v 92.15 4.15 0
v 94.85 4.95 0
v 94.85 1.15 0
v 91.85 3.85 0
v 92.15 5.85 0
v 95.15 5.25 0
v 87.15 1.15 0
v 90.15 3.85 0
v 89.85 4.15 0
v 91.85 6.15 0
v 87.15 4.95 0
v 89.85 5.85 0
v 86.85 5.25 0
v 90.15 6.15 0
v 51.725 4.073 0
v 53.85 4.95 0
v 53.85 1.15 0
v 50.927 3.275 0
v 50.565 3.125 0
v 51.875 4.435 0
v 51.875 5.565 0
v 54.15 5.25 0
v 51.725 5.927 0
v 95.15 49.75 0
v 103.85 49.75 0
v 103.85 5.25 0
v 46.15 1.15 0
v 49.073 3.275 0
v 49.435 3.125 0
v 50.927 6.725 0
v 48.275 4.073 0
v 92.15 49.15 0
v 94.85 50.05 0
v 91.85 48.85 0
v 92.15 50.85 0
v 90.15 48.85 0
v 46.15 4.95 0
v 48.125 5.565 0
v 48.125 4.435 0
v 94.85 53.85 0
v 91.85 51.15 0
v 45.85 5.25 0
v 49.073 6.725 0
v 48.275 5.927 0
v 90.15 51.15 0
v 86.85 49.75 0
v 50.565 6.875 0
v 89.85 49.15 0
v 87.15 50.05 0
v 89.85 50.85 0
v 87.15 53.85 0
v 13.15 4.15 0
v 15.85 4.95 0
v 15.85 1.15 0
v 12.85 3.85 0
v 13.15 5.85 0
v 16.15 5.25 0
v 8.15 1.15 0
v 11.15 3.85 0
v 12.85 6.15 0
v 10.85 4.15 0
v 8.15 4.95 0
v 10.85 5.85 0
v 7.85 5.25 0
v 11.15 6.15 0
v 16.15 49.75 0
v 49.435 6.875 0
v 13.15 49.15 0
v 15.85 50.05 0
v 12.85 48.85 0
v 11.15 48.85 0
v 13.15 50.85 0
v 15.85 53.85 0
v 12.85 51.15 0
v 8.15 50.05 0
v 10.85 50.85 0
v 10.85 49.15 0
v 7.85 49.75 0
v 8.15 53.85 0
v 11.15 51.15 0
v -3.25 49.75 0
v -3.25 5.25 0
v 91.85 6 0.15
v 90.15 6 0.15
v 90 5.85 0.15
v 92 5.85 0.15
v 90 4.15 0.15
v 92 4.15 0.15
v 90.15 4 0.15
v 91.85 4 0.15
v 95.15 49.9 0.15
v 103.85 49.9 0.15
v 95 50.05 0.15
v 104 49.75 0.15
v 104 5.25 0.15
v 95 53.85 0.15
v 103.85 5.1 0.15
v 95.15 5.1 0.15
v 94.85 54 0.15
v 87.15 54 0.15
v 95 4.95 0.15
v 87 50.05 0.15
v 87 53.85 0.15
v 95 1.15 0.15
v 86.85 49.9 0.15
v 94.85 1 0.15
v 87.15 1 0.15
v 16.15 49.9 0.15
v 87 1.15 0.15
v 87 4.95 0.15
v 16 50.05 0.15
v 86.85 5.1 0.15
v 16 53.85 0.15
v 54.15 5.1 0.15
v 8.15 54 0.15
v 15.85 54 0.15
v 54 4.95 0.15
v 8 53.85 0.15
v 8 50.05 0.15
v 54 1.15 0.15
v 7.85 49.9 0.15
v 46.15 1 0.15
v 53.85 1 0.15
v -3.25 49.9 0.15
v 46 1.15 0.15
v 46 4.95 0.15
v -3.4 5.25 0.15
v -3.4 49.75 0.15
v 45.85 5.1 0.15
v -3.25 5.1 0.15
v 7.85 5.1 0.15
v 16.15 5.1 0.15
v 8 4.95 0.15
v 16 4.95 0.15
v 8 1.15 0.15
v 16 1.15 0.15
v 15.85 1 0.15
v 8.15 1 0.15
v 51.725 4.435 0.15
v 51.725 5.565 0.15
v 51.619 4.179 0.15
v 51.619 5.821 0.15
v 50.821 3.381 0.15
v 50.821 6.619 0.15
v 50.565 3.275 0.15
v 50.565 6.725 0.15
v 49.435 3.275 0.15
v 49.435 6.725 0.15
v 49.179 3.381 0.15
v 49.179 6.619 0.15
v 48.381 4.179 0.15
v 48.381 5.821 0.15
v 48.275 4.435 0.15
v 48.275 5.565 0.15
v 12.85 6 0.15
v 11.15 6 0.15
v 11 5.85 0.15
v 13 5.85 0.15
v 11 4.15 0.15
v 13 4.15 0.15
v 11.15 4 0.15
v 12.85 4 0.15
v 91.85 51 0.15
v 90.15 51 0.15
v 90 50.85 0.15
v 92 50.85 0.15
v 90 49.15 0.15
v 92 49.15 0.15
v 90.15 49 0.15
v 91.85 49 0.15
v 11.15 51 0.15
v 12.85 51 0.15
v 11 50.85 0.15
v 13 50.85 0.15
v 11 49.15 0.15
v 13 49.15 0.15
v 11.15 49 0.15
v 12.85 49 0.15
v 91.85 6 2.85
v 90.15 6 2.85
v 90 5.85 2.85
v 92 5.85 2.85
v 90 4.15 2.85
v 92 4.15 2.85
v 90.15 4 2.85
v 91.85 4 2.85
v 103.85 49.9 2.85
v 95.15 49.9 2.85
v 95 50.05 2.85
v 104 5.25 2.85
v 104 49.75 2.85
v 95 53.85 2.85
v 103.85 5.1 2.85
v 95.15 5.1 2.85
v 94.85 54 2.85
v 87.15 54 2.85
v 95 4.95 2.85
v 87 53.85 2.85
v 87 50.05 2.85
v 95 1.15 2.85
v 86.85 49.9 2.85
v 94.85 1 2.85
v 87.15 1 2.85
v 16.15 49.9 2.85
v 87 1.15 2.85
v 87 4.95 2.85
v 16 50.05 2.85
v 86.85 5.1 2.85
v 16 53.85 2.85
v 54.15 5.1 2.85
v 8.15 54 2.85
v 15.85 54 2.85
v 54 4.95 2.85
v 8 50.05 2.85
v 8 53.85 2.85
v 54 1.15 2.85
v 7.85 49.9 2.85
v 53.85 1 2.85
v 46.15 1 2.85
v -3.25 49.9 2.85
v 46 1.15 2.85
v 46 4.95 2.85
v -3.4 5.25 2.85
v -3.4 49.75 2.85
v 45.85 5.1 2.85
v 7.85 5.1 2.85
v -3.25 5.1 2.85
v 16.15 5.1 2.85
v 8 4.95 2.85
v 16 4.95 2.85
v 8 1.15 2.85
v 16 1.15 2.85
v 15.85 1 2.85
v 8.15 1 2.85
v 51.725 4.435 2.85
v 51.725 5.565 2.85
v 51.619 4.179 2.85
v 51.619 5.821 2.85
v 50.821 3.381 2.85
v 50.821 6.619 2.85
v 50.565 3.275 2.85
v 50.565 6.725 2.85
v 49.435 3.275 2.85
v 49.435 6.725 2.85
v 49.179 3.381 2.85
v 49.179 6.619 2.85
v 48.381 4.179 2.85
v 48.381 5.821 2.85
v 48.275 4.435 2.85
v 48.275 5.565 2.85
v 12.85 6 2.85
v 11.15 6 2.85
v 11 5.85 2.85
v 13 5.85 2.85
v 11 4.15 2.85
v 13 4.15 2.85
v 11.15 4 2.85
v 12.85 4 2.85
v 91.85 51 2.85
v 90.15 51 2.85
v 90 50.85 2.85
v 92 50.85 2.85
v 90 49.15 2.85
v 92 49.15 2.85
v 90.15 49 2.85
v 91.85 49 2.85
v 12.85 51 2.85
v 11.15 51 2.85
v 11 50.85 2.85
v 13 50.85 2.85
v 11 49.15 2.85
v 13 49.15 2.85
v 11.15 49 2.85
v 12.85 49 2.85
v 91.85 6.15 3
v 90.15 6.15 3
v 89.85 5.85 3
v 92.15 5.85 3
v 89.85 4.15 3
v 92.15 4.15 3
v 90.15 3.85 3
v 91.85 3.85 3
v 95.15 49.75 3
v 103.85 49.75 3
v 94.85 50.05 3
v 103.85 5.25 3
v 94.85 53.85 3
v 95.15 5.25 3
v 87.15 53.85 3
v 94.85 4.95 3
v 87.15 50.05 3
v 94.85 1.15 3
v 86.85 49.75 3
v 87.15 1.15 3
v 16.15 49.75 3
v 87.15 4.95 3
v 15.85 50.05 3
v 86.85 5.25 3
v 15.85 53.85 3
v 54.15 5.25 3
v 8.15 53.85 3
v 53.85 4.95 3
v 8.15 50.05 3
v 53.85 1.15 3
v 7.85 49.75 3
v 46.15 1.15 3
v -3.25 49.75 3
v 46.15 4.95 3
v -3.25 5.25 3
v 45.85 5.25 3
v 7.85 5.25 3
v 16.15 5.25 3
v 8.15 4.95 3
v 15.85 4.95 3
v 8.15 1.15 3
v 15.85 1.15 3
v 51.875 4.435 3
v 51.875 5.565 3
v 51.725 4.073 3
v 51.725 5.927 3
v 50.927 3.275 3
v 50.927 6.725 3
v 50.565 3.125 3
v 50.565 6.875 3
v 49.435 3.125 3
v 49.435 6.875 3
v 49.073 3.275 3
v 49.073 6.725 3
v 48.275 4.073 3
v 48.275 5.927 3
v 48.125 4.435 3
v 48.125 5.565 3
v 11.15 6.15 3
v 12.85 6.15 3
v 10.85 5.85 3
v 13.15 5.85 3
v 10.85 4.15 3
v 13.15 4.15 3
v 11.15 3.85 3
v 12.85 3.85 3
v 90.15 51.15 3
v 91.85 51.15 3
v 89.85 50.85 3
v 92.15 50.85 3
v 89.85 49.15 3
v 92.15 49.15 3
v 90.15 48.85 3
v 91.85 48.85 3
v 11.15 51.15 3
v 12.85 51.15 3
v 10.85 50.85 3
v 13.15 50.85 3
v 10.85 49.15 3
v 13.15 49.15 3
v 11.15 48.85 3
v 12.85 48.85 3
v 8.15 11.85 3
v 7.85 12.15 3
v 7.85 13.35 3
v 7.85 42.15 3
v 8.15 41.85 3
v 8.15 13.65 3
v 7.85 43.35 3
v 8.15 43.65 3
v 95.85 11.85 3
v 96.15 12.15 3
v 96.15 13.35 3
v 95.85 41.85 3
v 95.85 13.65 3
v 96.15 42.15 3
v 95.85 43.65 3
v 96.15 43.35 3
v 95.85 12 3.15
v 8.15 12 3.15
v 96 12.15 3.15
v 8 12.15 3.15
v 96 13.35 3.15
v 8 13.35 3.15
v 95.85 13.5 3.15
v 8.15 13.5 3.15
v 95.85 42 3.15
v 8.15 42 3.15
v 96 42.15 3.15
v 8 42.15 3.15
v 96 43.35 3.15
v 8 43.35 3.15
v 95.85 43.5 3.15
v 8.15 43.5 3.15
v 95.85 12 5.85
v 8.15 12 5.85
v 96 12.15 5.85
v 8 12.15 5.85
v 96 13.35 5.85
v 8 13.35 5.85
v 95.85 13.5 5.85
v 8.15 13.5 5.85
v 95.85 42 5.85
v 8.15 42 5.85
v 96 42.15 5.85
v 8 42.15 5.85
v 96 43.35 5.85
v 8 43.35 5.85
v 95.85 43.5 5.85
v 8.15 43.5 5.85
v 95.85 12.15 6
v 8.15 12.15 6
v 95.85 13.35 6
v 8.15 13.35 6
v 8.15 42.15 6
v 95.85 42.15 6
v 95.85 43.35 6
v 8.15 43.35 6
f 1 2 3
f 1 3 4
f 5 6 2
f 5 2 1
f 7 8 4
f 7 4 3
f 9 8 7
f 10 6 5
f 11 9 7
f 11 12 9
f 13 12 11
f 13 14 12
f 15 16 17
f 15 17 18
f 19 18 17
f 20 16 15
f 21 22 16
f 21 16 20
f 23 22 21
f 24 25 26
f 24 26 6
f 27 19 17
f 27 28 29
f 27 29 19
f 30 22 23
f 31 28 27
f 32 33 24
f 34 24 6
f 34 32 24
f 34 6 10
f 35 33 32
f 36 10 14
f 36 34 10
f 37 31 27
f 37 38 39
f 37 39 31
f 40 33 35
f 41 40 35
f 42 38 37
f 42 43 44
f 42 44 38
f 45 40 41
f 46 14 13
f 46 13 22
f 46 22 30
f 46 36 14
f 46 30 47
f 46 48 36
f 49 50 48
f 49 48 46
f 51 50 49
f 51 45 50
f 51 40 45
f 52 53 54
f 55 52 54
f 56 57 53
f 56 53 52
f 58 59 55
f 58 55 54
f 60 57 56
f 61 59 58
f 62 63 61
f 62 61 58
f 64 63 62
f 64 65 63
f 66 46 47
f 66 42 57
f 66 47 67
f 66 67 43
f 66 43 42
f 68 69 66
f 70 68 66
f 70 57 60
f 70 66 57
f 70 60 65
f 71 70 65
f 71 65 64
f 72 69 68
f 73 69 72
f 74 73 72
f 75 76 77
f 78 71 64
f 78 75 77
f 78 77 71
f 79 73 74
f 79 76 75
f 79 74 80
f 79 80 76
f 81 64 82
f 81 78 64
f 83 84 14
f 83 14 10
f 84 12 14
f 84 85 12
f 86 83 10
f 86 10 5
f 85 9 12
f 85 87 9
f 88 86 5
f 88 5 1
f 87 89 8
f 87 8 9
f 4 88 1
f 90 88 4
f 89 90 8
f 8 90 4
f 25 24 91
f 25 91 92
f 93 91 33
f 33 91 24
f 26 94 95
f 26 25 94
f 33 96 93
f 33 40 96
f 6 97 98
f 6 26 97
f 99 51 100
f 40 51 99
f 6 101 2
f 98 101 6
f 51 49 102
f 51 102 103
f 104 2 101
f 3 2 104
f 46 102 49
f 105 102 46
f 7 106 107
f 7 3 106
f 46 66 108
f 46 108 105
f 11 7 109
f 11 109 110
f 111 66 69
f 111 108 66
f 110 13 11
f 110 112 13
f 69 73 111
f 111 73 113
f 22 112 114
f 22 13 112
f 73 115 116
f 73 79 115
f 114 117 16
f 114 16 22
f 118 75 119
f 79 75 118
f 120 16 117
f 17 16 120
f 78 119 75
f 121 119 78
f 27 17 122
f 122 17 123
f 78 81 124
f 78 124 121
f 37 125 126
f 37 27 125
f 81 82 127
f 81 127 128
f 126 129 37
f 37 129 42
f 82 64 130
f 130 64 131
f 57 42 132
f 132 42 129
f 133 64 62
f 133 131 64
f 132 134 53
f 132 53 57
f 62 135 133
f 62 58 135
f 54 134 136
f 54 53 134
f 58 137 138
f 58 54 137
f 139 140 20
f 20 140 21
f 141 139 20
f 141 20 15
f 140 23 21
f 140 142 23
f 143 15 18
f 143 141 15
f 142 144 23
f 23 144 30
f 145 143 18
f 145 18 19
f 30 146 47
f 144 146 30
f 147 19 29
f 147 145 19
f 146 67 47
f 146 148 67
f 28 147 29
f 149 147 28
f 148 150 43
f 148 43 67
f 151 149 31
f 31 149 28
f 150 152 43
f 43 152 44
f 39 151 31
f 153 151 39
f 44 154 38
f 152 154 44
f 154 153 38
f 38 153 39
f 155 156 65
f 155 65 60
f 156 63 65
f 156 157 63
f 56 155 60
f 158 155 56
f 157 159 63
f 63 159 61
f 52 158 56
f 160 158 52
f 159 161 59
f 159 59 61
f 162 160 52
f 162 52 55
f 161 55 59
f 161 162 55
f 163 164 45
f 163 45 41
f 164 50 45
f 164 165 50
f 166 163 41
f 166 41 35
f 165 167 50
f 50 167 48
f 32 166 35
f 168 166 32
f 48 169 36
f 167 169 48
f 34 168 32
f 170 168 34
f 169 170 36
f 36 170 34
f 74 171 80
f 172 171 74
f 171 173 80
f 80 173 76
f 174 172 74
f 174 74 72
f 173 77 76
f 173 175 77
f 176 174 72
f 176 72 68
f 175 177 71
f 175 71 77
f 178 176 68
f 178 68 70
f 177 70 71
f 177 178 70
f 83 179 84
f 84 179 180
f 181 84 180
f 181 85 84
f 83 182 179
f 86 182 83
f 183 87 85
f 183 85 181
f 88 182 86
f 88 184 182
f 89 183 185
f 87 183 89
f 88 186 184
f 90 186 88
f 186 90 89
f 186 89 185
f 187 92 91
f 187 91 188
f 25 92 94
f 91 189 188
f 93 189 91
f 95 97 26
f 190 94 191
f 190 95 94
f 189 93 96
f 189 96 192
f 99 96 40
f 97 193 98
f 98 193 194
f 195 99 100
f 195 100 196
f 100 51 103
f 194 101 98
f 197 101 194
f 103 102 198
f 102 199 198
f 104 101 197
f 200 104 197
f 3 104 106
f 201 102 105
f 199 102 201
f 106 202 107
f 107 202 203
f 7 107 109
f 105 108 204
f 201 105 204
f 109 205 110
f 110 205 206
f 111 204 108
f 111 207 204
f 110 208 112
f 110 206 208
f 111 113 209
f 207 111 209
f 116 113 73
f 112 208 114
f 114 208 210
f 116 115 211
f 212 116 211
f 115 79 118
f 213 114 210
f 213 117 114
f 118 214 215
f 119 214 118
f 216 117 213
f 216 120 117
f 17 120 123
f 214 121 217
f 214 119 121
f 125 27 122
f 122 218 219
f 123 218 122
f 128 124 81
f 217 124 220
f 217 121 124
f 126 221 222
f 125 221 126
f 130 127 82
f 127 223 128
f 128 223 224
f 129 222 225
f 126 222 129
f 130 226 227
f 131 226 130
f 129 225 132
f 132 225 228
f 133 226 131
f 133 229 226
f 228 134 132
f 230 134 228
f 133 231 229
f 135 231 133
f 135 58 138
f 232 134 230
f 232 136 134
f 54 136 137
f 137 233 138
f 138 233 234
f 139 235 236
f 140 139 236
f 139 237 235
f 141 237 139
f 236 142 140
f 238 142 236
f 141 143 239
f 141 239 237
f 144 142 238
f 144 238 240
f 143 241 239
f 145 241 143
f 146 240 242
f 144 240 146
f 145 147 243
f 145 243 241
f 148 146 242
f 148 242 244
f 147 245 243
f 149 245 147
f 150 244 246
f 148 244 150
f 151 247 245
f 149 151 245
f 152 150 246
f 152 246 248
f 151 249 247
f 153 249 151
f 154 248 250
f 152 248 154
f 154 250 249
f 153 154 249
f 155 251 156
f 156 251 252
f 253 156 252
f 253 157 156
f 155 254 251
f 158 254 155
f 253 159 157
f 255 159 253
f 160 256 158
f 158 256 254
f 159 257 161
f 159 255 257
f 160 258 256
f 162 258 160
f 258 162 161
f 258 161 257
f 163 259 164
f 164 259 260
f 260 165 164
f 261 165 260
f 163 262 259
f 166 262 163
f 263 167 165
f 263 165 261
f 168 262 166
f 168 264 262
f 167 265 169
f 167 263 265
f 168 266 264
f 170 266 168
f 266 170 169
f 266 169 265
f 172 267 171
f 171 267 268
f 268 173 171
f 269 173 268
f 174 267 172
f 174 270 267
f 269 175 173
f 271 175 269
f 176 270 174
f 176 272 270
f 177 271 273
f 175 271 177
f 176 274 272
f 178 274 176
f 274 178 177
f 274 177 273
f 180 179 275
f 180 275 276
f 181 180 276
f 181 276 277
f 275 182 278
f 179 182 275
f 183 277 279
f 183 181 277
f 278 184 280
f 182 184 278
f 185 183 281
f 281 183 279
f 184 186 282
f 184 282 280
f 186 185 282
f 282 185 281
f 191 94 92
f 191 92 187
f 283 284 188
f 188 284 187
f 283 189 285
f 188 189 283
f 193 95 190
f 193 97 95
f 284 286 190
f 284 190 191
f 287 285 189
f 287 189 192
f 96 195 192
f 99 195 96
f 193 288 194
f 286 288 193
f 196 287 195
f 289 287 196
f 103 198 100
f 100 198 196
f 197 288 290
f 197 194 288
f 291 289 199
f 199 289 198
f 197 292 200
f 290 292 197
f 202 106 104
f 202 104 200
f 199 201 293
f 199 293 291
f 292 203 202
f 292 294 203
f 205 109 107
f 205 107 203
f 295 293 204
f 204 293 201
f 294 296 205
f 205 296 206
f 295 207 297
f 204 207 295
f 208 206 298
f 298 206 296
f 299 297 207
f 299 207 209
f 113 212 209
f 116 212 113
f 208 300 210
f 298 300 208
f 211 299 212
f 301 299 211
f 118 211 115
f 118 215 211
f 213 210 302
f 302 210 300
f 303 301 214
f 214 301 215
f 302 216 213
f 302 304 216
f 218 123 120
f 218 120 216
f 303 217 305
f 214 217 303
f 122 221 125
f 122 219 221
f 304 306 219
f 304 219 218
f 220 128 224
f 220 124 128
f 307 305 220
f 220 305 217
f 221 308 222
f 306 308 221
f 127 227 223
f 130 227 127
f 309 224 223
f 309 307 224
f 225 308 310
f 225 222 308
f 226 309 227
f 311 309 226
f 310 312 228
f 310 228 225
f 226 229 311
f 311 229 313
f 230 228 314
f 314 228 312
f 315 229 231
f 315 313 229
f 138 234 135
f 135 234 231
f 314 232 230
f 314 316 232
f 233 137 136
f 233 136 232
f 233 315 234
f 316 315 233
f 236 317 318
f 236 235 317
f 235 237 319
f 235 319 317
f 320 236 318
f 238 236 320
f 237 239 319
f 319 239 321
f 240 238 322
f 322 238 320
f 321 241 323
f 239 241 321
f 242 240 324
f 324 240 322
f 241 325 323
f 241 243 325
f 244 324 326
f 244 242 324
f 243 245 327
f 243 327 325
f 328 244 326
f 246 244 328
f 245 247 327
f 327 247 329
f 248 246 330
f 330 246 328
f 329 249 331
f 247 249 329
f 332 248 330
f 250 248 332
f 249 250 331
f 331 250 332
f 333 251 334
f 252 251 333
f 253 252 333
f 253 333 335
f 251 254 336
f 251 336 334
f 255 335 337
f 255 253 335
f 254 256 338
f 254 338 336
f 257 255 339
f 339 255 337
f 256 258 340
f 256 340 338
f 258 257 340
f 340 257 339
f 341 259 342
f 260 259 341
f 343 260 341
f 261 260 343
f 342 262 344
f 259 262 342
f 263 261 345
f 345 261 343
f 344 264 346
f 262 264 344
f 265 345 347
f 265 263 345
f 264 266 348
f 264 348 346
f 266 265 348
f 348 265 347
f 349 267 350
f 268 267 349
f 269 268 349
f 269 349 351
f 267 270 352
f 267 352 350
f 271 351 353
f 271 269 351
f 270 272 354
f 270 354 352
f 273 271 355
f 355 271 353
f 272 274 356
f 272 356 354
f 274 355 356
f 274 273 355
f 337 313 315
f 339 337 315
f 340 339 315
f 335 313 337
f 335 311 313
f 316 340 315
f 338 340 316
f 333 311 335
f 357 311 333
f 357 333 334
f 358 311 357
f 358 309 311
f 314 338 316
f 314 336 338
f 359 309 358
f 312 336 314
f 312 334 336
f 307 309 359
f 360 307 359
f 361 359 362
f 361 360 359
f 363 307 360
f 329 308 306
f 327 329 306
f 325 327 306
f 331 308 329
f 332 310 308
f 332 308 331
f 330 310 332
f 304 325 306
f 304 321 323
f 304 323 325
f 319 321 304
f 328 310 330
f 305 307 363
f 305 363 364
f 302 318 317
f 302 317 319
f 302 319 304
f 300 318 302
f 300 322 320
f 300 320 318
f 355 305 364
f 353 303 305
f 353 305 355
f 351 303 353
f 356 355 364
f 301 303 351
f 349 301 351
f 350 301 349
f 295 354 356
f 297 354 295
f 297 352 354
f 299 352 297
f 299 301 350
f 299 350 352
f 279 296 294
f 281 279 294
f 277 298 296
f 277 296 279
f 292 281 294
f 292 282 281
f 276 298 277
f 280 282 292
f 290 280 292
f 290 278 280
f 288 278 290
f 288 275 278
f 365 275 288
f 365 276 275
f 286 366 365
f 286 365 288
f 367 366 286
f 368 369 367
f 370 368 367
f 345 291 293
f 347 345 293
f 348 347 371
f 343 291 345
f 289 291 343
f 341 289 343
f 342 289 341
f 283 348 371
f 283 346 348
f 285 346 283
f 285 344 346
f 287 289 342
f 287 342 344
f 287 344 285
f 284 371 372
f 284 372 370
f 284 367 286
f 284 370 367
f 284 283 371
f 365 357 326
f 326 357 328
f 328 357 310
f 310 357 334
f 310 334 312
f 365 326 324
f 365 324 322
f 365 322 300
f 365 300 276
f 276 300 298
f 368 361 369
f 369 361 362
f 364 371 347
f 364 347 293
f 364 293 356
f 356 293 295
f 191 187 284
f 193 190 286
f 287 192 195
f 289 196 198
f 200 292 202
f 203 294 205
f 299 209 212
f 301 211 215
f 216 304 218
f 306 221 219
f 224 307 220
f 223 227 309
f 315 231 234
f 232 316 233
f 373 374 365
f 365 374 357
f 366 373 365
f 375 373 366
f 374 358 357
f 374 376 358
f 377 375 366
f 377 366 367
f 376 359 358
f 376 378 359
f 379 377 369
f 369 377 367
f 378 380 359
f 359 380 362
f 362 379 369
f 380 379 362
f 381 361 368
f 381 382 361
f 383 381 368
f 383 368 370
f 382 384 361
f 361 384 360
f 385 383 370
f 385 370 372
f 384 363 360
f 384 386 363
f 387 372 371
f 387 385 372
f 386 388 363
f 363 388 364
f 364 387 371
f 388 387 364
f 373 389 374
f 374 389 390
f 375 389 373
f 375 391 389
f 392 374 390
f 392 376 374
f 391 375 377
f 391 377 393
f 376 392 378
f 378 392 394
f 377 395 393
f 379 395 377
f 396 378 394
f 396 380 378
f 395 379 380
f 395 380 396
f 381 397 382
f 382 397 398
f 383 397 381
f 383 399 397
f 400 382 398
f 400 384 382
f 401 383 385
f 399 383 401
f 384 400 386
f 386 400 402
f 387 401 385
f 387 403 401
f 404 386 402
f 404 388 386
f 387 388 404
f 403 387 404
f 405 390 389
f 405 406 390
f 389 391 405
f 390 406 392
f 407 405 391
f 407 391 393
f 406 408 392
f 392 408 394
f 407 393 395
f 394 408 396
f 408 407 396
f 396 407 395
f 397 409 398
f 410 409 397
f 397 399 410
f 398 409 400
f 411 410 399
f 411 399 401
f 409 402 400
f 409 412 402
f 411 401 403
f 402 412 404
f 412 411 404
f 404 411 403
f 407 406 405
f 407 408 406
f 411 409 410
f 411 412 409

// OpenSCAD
// Generated from canonical Python sources by spec/revise_parent_battery_top_lid.py.
polyhedron(points=[[92.1500015258789, 4.150000095367432, 0.0], [94.8499984741211, 4.949999809265137, 0.0], [94.8499984741211, 1.149999976158142, 5.9999998100067255e-15], [91.8499984741211, 3.8499999046325684, 0.0], [92.1500015258789, 5.849999904632568, 0.0], [95.1500015258789, 5.25, 0.0], [87.1500015258789, 1.149999976158142, -1.0000000036274937e-15], [90.1500015258789, 3.8499999046325684, 0.0], [89.8499984741211, 4.150000095367432, 0.0], [91.8499984741211, 6.150000095367432, 0.0], [87.1500015258789, 4.949999809265137, 0.0], [89.8499984741211, 5.849999904632568, 0.0], [86.8499984741211, 5.25, 0.0], [90.1500015258789, 6.150000095367432, 0.0], [51.724998474121094, 4.073349475860596, 0.0], [53.849998474121094, 4.949999809265137, 0.0], [53.849998474121094, 1.149999976158142, 2.9999999050033628e-15], [50.92665100097656, 3.2750000953674316, 0.0], [50.564517974853516, 3.125, 0.0], [51.875, 4.435481548309326, 0.0], [51.875, 5.564518451690674, 0.0], [54.150001525878906, 5.25, 0.0], [51.724998474121094, 5.926650524139404, 0.0], [95.1500015258789, 49.75, 0.0], [103.8499984741211, 49.75, 2.0000000072549875e-15], [103.8499984741211, 5.25, 1.0000000036274937e-15], [46.150001525878906, 1.149999976158142, 1.0000000036274937e-15], [49.07334899902344, 3.2750000953674316, 0.0], [49.435482025146484, 3.125, 0.0], [50.92665100097656, 6.724999904632568, 0.0], [48.275001525878906, 4.073349475860596, 0.0], [92.1500015258789, 49.150001525878906, 0.0], [94.8499984741211, 50.04999923706055, 0.0], [91.8499984741211, 48.849998474121094, 0.0], [92.1500015258789, 50.849998474121094, 0.0], [90.1500015258789, 48.849998474121094, 0.0], [46.150001525878906, 4.949999809265137, 0.0], [48.125, 5.564518451690674, 0.0], [48.125, 4.435481548309326, 0.0], [94.8499984741211, 53.849998474121094, 9.000000350284799e-15], [91.8499984741211, 51.150001525878906, 0.0], [45.849998474121094, 5.25, 0.0], [49.07334899902344, 6.724999904632568, 0.0], [48.275001525878906, 5.926650524139404, 0.0], [90.1500015258789, 51.150001525878906, 0.0], [86.8499984741211, 49.75, 0.0], [50.564517974853516, 6.875, 0.0], [89.8499984741211, 49.150001525878906, 0.0], [87.1500015258789, 50.04999923706055, 0.0], [89.8499984741211, 50.849998474121094, 0.0], [87.1500015258789, 53.849998474121094, 2.0000000072549875e-15], [13.149999618530273, 4.150000095367432, 0.0], [15.850000381469727, 4.949999809265137, 0.0], [15.850000381469727, 1.149999976158142, 0.0], [12.850000381469727, 3.8499999046325684, 0.0], [13.149999618530273, 5.849999904632568, 0.0], [16.149999618530273, 5.25, 0.0], [8.149999618530273, 1.149999976158142, 0.0], [11.149999618530273, 3.8499999046325684, 0.0], [12.850000381469727, 6.150000095367432, 0.0], [10.850000381469727, 4.150000095367432, 0.0], [8.149999618530273, 4.949999809265137, 0.0], [10.850000381469727, 5.849999904632568, 0.0], [7.849999904632568, 5.25, 0.0], [11.149999618530273, 6.150000095367432, 0.0], [16.149999618530273, 49.75, 0.0], [49.435482025146484, 6.875, 0.0], [13.149999618530273, 49.150001525878906, 0.0], [15.850000381469727, 50.04999923706055, 0.0], [12.850000381469727, 48.849998474121094, 0.0], [11.149999618530273, 48.849998474121094, 0.0], [13.149999618530273, 50.849998474121094, 0.0], [15.850000381469727, 53.849998474121094, 2.9999999050033628e-15], [12.850000381469727, 51.150001525878906, 0.0], [8.149999618530273, 50.04999923706055, 0.0], [10.850000381469727, 50.849998474121094, 0.0], [10.850000381469727, 49.150001525878906, 0.0], [7.849999904632568, 49.75, 0.0], [8.149999618530273, 53.849998474121094, 2.9999999050033628e-15], [11.149999618530273, 51.150001525878906, 0.0], [-3.25, 49.75, 1.0000000036274937e-15], [-3.25, 5.25, 0.0], [91.8499984741211, 6.0, 0.15000000596046448], [90.1500015258789, 6.0, 0.15000000596046448], [90.0, 5.849999904632568, 0.15000000596046448], [92.0, 5.849999904632568, 0.15000000596046448], [90.0, 4.150000095367432, 0.15000000596046448], [92.0, 4.150000095367432, 0.15000000596046448], [90.1500015258789, 4.0, 0.15000000596046448], [91.8499984741211, 4.0, 0.15000000596046448], [95.1500015258789, 49.900001525878906, 0.15000000596046448], [103.8499984741211, 49.900001525878906, 0.15000000596046448], [95.0, 50.04999923706055, 0.15000000596046448], [104.0, 49.75, 0.15000000596046448], [104.0, 5.25, 0.15000000596046448], [95.0, 53.849998474121094, 0.15000000596046448], [103.8499984741211, 5.099999904632568, 0.15000000596046448], [95.1500015258789, 5.099999904632568, 0.15000000596046448], [94.8499984741211, 54.0, 0.15000000596046448], [87.1500015258789, 54.0, 0.15000000596046448], [95.0, 4.949999809265137, 0.15000000596046448], [87.0, 50.04999923706055, 0.15000000596046448], [87.0, 53.849998474121094, 0.15000000596046448], [95.0, 1.149999976158142, 0.15000000596046448], [86.8499984741211, 49.900001525878906, 0.15000000596046448], [94.8499984741211, 1.0, 0.15000000596046448], [87.1500015258789, 1.0, 0.15000000596046448], [16.149999618530273, 49.900001525878906, 0.15000000596046448], [87.0, 1.149999976158142, 0.15000000596046448], [87.0, 4.949999809265137, 0.15000000596046448], [16.0, 50.04999923706055, 0.15000000596046448], [86.8499984741211, 5.099999904632568, 0.15000000596046448], [16.0, 53.849998474121094, 0.15000000596046448], [54.150001525878906, 5.099999904632568, 0.15000000596046448], [8.149999618530273, 54.0, 0.15000000596046448], [15.850000381469727, 54.0, 0.15000000596046448], [54.0, 4.949999809265137, 0.15000000596046448], [8.0, 53.849998474121094, 0.15000000596046448], [8.0, 50.04999923706055, 0.15000000596046448], [54.0, 1.149999976158142, 0.15000000596046448], [7.849999904632568, 49.900001525878906, 0.15000000596046448], [46.150001525878906, 1.0, 0.15000000596046448], [53.849998474121094, 1.0, 0.15000000596046448], [-3.25, 49.900001525878906, 0.15000000596046448], [46.0, 1.149999976158142, 0.15000000596046448], [46.0, 4.949999809265137, 0.15000000596046448], [-3.4000000953674316, 5.25, 0.15000000596046448], [-3.4000000953674316, 49.75, 0.15000000596046448], [45.849998474121094, 5.099999904632568, 0.15000000596046448], [-3.25, 5.099999904632568, 0.15000000596046448], [7.849999904632568, 5.099999904632568, 0.15000000596046448], [16.149999618530273, 5.099999904632568, 0.15000000596046448], [8.0, 4.949999809265137, 0.15000000596046448], [16.0, 4.949999809265137, 0.15000000596046448], [8.0, 1.149999976158142, 0.15000000596046448], [16.0, 1.149999976158142, 0.15000000596046448], [15.850000381469727, 1.0, 0.15000000596046448], [8.149999618530273, 1.0, 0.15000000596046448], [51.724998474121094, 4.435481548309326, 0.15000000596046448], [51.724998474121094, 5.564518451690674, 0.15000000596046448], [51.618934631347656, 4.179415702819824, 0.15000000596046448], [51.618934631347656, 5.820584297180176, 0.15000000596046448], [50.82058334350586, 3.381066083908081, 0.15000000596046448], [50.82058334350586, 6.618934154510498, 0.15000000596046448], [50.564517974853516, 3.2750000953674316, 0.15000000596046448], [50.564517974853516, 6.724999904632568, 0.15000000596046448], [49.435482025146484, 3.2750000953674316, 0.15000000596046448], [49.435482025146484, 6.724999904632568, 0.15000000596046448], [49.17941665649414, 3.381066083908081, 0.15000000596046448], [49.17941665649414, 6.618934154510498, 0.15000000596046448], [48.381065368652344, 4.179415702819824, 0.15000000596046448], [48.381065368652344, 5.820584297180176, 0.15000000596046448], [48.275001525878906, 4.435481548309326, 0.15000000596046448], [48.275001525878906, 5.564518451690674, 0.15000000596046448], [12.850000381469727, 6.0, 0.15000000596046448], [11.149999618530273, 6.0, 0.15000000596046448], [11.0, 5.849999904632568, 0.15000000596046448], [13.0, 5.849999904632568, 0.15000000596046448], [11.0, 4.150000095367432, 0.15000000596046448], [13.0, 4.150000095367432, 0.15000000596046448], [11.149999618530273, 4.0, 0.15000000596046448], [12.850000381469727, 4.0, 0.15000000596046448], [91.8499984741211, 51.0, 0.15000000596046448], [90.1500015258789, 51.0, 0.15000000596046448], [90.0, 50.849998474121094, 0.15000000596046448], [92.0, 50.849998474121094, 0.15000000596046448], [90.0, 49.150001525878906, 0.15000000596046448], [92.0, 49.150001525878906, 0.15000000596046448], [90.1500015258789, 49.0, 0.15000000596046448], [91.8499984741211, 49.0, 0.15000000596046448], [11.149999618530273, 51.0, 0.15000000596046448], [12.850000381469727, 51.0, 0.15000000596046448], [11.0, 50.849998474121094, 0.15000000596046448], [13.0, 50.849998474121094, 0.15000000596046448], [11.0, 49.150001525878906, 0.15000000596046448], [13.0, 49.150001525878906, 0.15000000596046448], [11.149999618530273, 49.0, 0.15000000596046448], [12.850000381469727, 49.0, 0.15000000596046448], [91.8499984741211, 6.0, 2.8499999046325684], [90.1500015258789, 6.0, 2.8499999046325684], [90.0, 5.849999904632568, 2.8499999046325684], [92.0, 5.849999904632568, 2.8499999046325684], [90.0, 4.150000095367432, 2.8499999046325684], [92.0, 4.150000095367432, 2.8499999046325684], [90.1500015258789, 4.0, 2.8499999046325684], [91.8499984741211, 4.0, 2.8499999046325684], [103.8499984741211, 49.900001525878906, 2.8499999046325684], [95.1500015258789, 49.900001525878906, 2.8499999046325684], [95.0, 50.04999923706055, 2.8499999046325684], [104.0, 5.25, 2.8499999046325684], [104.0, 49.75, 2.8499999046325684], [95.0, 53.849998474121094, 2.8499999046325684], [103.8499984741211, 5.099999904632568, 2.8499999046325684], [95.1500015258789, 5.099999904632568, 2.8499999046325684], [94.8499984741211, 54.0, 2.8499999046325684], [87.1500015258789, 54.0, 2.8499999046325684], [95.0, 4.949999809265137, 2.8499999046325684], [87.0, 53.849998474121094, 2.8499999046325684], [87.0, 50.04999923706055, 2.8499999046325684], [95.0, 1.149999976158142, 2.8499999046325684], [86.8499984741211, 49.900001525878906, 2.8499999046325684], [94.8499984741211, 1.0, 2.8499999046325684], [87.1500015258789, 1.0, 2.8499999046325684], [16.149999618530273, 49.900001525878906, 2.8499999046325684], [87.0, 1.149999976158142, 2.8499999046325684], [87.0, 4.949999809265137, 2.8499999046325684], [16.0, 50.04999923706055, 2.8499999046325684], [86.8499984741211, 5.099999904632568, 2.8499999046325684], [16.0, 53.849998474121094, 2.8499999046325684], [54.150001525878906, 5.099999904632568, 2.8499999046325684], [8.149999618530273, 54.0, 2.8499999046325684], [15.850000381469727, 54.0, 2.8499999046325684], [54.0, 4.949999809265137, 2.8499999046325684], [8.0, 50.04999923706055, 2.8499999046325684], [8.0, 53.849998474121094, 2.8499999046325684], [54.0, 1.149999976158142, 2.8499999046325684], [7.849999904632568, 49.900001525878906, 2.8499999046325684], [53.849998474121094, 1.0, 2.8499999046325684], [46.150001525878906, 1.0, 2.8499999046325684], [-3.25, 49.900001525878906, 2.8499999046325684], [46.0, 1.149999976158142, 2.8499999046325684], [46.0, 4.949999809265137, 2.8499999046325684], [-3.4000000953674316, 5.25, 2.8499999046325684], [-3.4000000953674316, 49.75, 2.8499999046325684], [45.849998474121094, 5.099999904632568, 2.8499999046325684], [7.849999904632568, 5.099999904632568, 2.8499999046325684], [-3.25, 5.099999904632568, 2.8499999046325684], [16.149999618530273, 5.099999904632568, 2.8499999046325684], [8.0, 4.949999809265137, 2.8499999046325684], [16.0, 4.949999809265137, 2.8499999046325684], [8.0, 1.149999976158142, 2.8499999046325684], [16.0, 1.149999976158142, 2.8499999046325684], [15.850000381469727, 1.0, 2.8499999046325684], [8.149999618530273, 1.0, 2.8499999046325684], [51.724998474121094, 4.435481548309326, 2.8499999046325684], [51.724998474121094, 5.564518451690674, 2.8499999046325684], [51.618934631347656, 4.179415702819824, 2.8499999046325684], [51.618934631347656, 5.820584297180176, 2.8499999046325684], [50.82058334350586, 3.381066083908081, 2.8499999046325684], [50.82058334350586, 6.618934154510498, 2.8499999046325684], [50.564517974853516, 3.2750000953674316, 2.8499999046325684], [50.564517974853516, 6.724999904632568, 2.8499999046325684], [49.435482025146484, 3.2750000953674316, 2.8499999046325684], [49.435482025146484, 6.724999904632568, 2.8499999046325684], [49.17941665649414, 3.381066083908081, 2.8499999046325684], [49.17941665649414, 6.618934154510498, 2.8499999046325684], [48.381065368652344, 4.179415702819824, 2.8499999046325684], [48.381065368652344, 5.820584297180176, 2.8499999046325684], [48.275001525878906, 4.435481548309326, 2.8499999046325684], [48.275001525878906, 5.564518451690674, 2.8499999046325684], [12.850000381469727, 6.0, 2.8499999046325684], [11.149999618530273, 6.0, 2.8499999046325684], [11.0, 5.849999904632568, 2.8499999046325684], [13.0, 5.849999904632568, 2.8499999046325684], [11.0, 4.150000095367432, 2.8499999046325684], [13.0, 4.150000095367432, 2.8499999046325684], [11.149999618530273, 4.0, 2.8499999046325684], [12.850000381469727, 4.0, 2.8499999046325684], [91.8499984741211, 51.0, 2.8499999046325684], [90.1500015258789, 51.0, 2.8499999046325684], [90.0, 50.849998474121094, 2.8499999046325684], [92.0, 50.849998474121094, 2.8499999046325684], [90.0, 49.150001525878906, 2.8499999046325684], [92.0, 49.150001525878906, 2.8499999046325684], [90.1500015258789, 49.0, 2.8499999046325684], [91.8499984741211, 49.0, 2.8499999046325684], [12.850000381469727, 51.0, 2.8499999046325684], [11.149999618530273, 51.0, 2.8499999046325684], [11.0, 50.849998474121094, 2.8499999046325684], [13.0, 50.849998474121094, 2.8499999046325684], [11.0, 49.150001525878906, 2.8499999046325684], [13.0, 49.150001525878906, 2.8499999046325684], [11.149999618530273, 49.0, 2.8499999046325684], [12.850000381469727, 49.0, 2.8499999046325684], [91.8499984741211, 6.150000095367432, 3.0], [90.1500015258789, 6.150000095367432, 3.0], [89.8499984741211, 5.849999904632568, 3.0], [92.1500015258789, 5.849999904632568, 3.0], [89.8499984741211, 4.150000095367432, 3.0], [92.1500015258789, 4.150000095367432, 3.0], [90.1500015258789, 3.8499999046325684, 3.0], [91.8499984741211, 3.8499999046325684, 3.0], [95.1500015258789, 49.75, 3.0], [103.8499984741211, 49.75, 3.0], [94.8499984741211, 50.04999923706055, 3.0], [103.8499984741211, 5.25, 3.0], [94.8499984741211, 53.849998474121094, 3.0], [95.1500015258789, 5.25, 3.0], [87.1500015258789, 53.849998474121094, 3.0], [94.8499984741211, 4.949999809265137, 3.0], [87.1500015258789, 50.04999923706055, 3.0], [94.8499984741211, 1.149999976158142, 3.0], [86.8499984741211, 49.75, 3.0], [87.1500015258789, 1.149999976158142, 3.0], [16.149999618530273, 49.75, 3.0], [87.1500015258789, 4.949999809265137, 3.0], [15.850000381469727, 50.04999923706055, 3.0], [86.8499984741211, 5.25, 3.0], [15.850000381469727, 53.849998474121094, 3.0], [54.150001525878906, 5.25, 3.0], [8.149999618530273, 53.849998474121094, 3.0], [53.849998474121094, 4.949999809265137, 3.0], [8.149999618530273, 50.04999923706055, 3.0], [53.849998474121094, 1.149999976158142, 3.0], [7.849999904632568, 49.75, 3.0], [46.150001525878906, 1.149999976158142, 3.0], [-3.25, 49.75, 3.0], [46.150001525878906, 4.949999809265137, 3.0], [-3.25, 5.25, 3.0], [45.849998474121094, 5.25, 3.0], [7.849999904632568, 5.25, 3.0], [16.149999618530273, 5.25, 3.0], [8.149999618530273, 4.949999809265137, 3.0], [15.850000381469727, 4.949999809265137, 3.0], [8.149999618530273, 1.149999976158142, 3.0], [15.850000381469727, 1.149999976158142, 3.0], [51.875, 4.435481548309326, 3.0], [51.875, 5.564518451690674, 3.0], [51.724998474121094, 4.073349475860596, 3.0], [51.724998474121094, 5.926650524139404, 3.0], [50.92665100097656, 3.2750000953674316, 3.0], [50.92665100097656, 6.724999904632568, 3.0], [50.564517974853516, 3.125, 3.0], [50.564517974853516, 6.875, 3.0], [49.435482025146484, 3.125, 3.0], [49.435482025146484, 6.875, 3.0], [49.07334899902344, 3.2750000953674316, 3.0], [49.07334899902344, 6.724999904632568, 3.0], [48.275001525878906, 4.073349475860596, 3.0], [48.275001525878906, 5.926650524139404, 3.0], [48.125, 4.435481548309326, 3.0], [48.125, 5.564518451690674, 3.0], [11.149999618530273, 6.150000095367432, 3.0], [12.850000381469727, 6.150000095367432, 3.0], [10.850000381469727, 5.849999904632568, 3.0], [13.149999618530273, 5.849999904632568, 3.0], [10.850000381469727, 4.150000095367432, 3.0], [13.149999618530273, 4.150000095367432, 3.0], [11.149999618530273, 3.8499999046325684, 3.0], [12.850000381469727, 3.8499999046325684, 3.0], [90.1500015258789, 51.150001525878906, 3.0], [91.8499984741211, 51.150001525878906, 3.0], [89.8499984741211, 50.849998474121094, 3.0], [92.1500015258789, 50.849998474121094, 3.0], [89.8499984741211, 49.150001525878906, 3.0], [92.1500015258789, 49.150001525878906, 3.0], [90.1500015258789, 48.849998474121094, 3.0], [91.8499984741211, 48.849998474121094, 3.0], [11.149999618530273, 51.150001525878906, 3.0], [12.850000381469727, 51.150001525878906, 3.0], [10.850000381469727, 50.849998474121094, 3.0], [13.149999618530273, 50.849998474121094, 3.0], [10.850000381469727, 49.150001525878906, 3.0], [13.149999618530273, 49.150001525878906, 3.0], [11.149999618530273, 48.849998474121094, 3.0], [12.850000381469727, 48.849998474121094, 3.0], [8.149999618530273, 11.850000381469727, 3.0], [7.849999904632568, 12.149999618530273, 3.0], [7.849999904632568, 13.350000381469727, 3.0], [7.849999904632568, 42.150001525878906, 3.0], [8.149999618530273, 41.849998474121094, 3.0], [8.149999618530273, 13.649999618530273, 3.0], [7.849999904632568, 43.349998474121094, 3.0], [8.149999618530273, 43.650001525878906, 3.0], [95.8499984741211, 11.850000381469727, 3.0], [96.1500015258789, 12.149999618530273, 3.0], [96.1500015258789, 13.350000381469727, 3.0], [95.8499984741211, 41.849998474121094, 3.0], [95.8499984741211, 13.649999618530273, 3.0], [96.1500015258789, 42.150001525878906, 3.0], [95.8499984741211, 43.650001525878906, 3.0], [96.1500015258789, 43.349998474121094, 3.0], [95.8499984741211, 12.0, 3.1500000953674316], [8.149999618530273, 12.0, 3.1500000953674316], [96.0, 12.149999618530273, 3.1500000953674316], [8.0, 12.149999618530273, 3.1500000953674316], [96.0, 13.350000381469727, 3.1500000953674316], [8.0, 13.350000381469727, 3.1500000953674316], [95.8499984741211, 13.5, 3.1500000953674316], [8.149999618530273, 13.5, 3.1500000953674316], [95.8499984741211, 42.0, 3.1500000953674316], [8.149999618530273, 42.0, 3.1500000953674316], [96.0, 42.150001525878906, 3.1500000953674316], [8.0, 42.150001525878906, 3.1500000953674316], [96.0, 43.349998474121094, 3.1500000953674316], [8.0, 43.349998474121094, 3.1500000953674316], [95.8499984741211, 43.5, 3.1500000953674316], [8.149999618530273, 43.5, 3.1500000953674316], [95.8499984741211, 12.0, 5.849999904632568], [8.149999618530273, 12.0, 5.849999904632568], [96.0, 12.149999618530273, 5.849999904632568], [8.0, 12.149999618530273, 5.849999904632568], [96.0, 13.350000381469727, 5.849999904632568], [8.0, 13.350000381469727, 5.849999904632568], [95.8499984741211, 13.5, 5.849999904632568], [8.149999618530273, 13.5, 5.849999904632568], [95.8499984741211, 42.0, 5.849999904632568], [8.149999618530273, 42.0, 5.849999904632568], [96.0, 42.150001525878906, 5.849999904632568], [8.0, 42.150001525878906, 5.849999904632568], [96.0, 43.349998474121094, 5.849999904632568], [8.0, 43.349998474121094, 5.849999904632568], [95.8499984741211, 43.5, 5.849999904632568], [8.149999618530273, 43.5, 5.849999904632568], [95.8499984741211, 12.149999618530273, 6.0], [8.149999618530273, 12.149999618530273, 6.0], [95.8499984741211, 13.350000381469727, 6.0], [8.149999618530273, 13.350000381469727, 6.0], [8.149999618530273, 42.150001525878906, 6.0], [95.8499984741211, 42.150001525878906, 6.0], [95.8499984741211, 43.349998474121094, 6.0], [8.149999618530273, 43.349998474121094, 6.0]],faces=[[2, 1, 0], [3, 2, 0], [1, 5, 4], [0, 1, 4], [3, 7, 6], [2, 3, 6], [6, 7, 8], [4, 5, 9], [6, 8, 10], [8, 11, 10], [10, 11, 12], [11, 13, 12], [16, 15, 14], [17, 16, 14], [16, 17, 18], [14, 15, 19], [15, 21, 20], [19, 15, 20], [20, 21, 22], [25, 24, 23], [5, 25, 23], [16, 18, 26], [28, 27, 26], [18, 28, 26], [22, 21, 29], [26, 27, 30], [23, 32, 31], [5, 23, 33], [23, 31, 33], [9, 5, 33], [31, 32, 34], [13, 9, 35], [9, 33, 35], [26, 30, 36], [38, 37, 36], [30, 38, 36], [34, 32, 39], [34, 39, 40], [36, 37, 41], [43, 42, 41], [37, 43, 41], [40, 39, 44], [12, 13, 45], [21, 12, 45], [29, 21, 45], [13, 35, 45], [46, 29, 45], [35, 47, 45], [47, 49, 48], [45, 47, 48], [48, 49, 50], [49, 44, 50], [44, 39, 50], [53, 52, 51], [53, 51, 54], [52, 56, 55], [51, 52, 55], [54, 58, 57], [53, 54, 57], [55, 56, 59], [57, 58, 60], [60, 62, 61], [57, 60, 61], [61, 62, 63], [62, 64, 63], [46, 45, 65], [56, 41, 65], [66, 46, 65], [42, 66, 65], [41, 42, 65], [65, 68, 67], [65, 67, 69], [59, 56, 69], [56, 65, 69], [64, 59, 69], [64, 69, 70], [63, 64, 70], [67, 68, 71], [71, 68, 72], [71, 72, 73], [76, 75, 74], [63, 70, 77], [76, 74, 77], [70, 76, 77], [73, 72, 78], [74, 75, 78], [79, 73, 78], [75, 79, 78], [81, 63, 80], [63, 77, 80], [13, 83, 82], [9, 13, 82], [13, 11, 83], [11, 84, 83], [9, 82, 85], [4, 9, 85], [11, 8, 84], [8, 86, 84], [4, 85, 87], [0, 4, 87], [7, 88, 86], [8, 7, 86], [0, 87, 3], [3, 87, 89], [7, 89, 88], [3, 89, 7], [90, 23, 24], [91, 90, 24], [32, 90, 92], [23, 90, 32], [94, 93, 25], [93, 24, 25], [92, 95, 32], [95, 39, 32], [97, 96, 5], [96, 25, 5], [99, 50, 98], [98, 50, 39], [1, 100, 5], [5, 100, 97], [101, 48, 50], [102, 101, 50], [100, 1, 103], [103, 1, 2], [48, 101, 45], [45, 101, 104], [106, 105, 6], [105, 2, 6], [107, 65, 45], [104, 107, 45], [108, 6, 10], [109, 108, 10], [68, 65, 110], [65, 107, 110], [10, 12, 109], [12, 111, 109], [110, 72, 68], [112, 72, 110], [113, 111, 21], [111, 12, 21], [115, 114, 72], [114, 78, 72], [15, 116, 113], [21, 15, 113], [118, 74, 117], [117, 74, 78], [116, 15, 119], [119, 15, 16], [74, 118, 77], [77, 118, 120], [121, 16, 26], [122, 16, 121], [123, 80, 77], [120, 123, 77], [125, 124, 36], [124, 26, 36], [126, 81, 80], [127, 126, 80], [36, 128, 125], [41, 128, 36], [129, 63, 81], [130, 63, 129], [131, 41, 56], [128, 41, 131], [61, 63, 132], [63, 130, 132], [52, 133, 131], [56, 52, 131], [132, 134, 61], [134, 57, 61], [135, 133, 53], [133, 52, 53], [137, 136, 57], [136, 53, 57], [19, 139, 138], [20, 139, 19], [19, 138, 140], [14, 19, 140], [20, 22, 139], [22, 141, 139], [17, 14, 142], [14, 140, 142], [22, 143, 141], [29, 143, 22], [17, 142, 144], [18, 17, 144], [46, 145, 29], [29, 145, 143], [28, 18, 146], [18, 144, 146], [46, 66, 145], [66, 147, 145], [28, 146, 27], [27, 146, 148], [42, 149, 147], [66, 42, 147], [30, 148, 150], [27, 148, 30], [42, 151, 149], [43, 151, 42], [30, 150, 38], [38, 150, 152], [37, 153, 43], [43, 153, 151], [37, 152, 153], [38, 152, 37], [64, 155, 154], [59, 64, 154], [64, 62, 155], [62, 156, 155], [59, 154, 55], [55, 154, 157], [62, 158, 156], [60, 158, 62], [55, 157, 51], [51, 157, 159], [58, 160, 158], [60, 58, 158], [51, 159, 161], [54, 51, 161], [58, 54, 160], [54, 161, 160], [44, 163, 162], [40, 44, 162], [44, 49, 163], [49, 164, 163], [40, 162, 165], [34, 40, 165], [49, 166, 164], [47, 166, 49], [34, 165, 31], [31, 165, 167], [35, 168, 47], [47, 168, 166], [31, 167, 33], [33, 167, 169], [35, 169, 168], [33, 169, 35], [79, 170, 73], [73, 170, 171], [79, 172, 170], [75, 172, 79], [73, 171, 173], [71, 73, 173], [75, 76, 172], [76, 174, 172], [71, 173, 175], [67, 71, 175], [70, 176, 174], [76, 70, 174], [67, 175, 177], [69, 67, 177], [70, 69, 176], [69, 177, 176], [83, 178, 82], [179, 178, 83], [179, 83, 180], [83, 84, 180], [178, 181, 82], [82, 181, 85], [84, 86, 182], [180, 84, 182], [85, 181, 87], [181, 183, 87], [184, 182, 88], [88, 182, 86], [183, 185, 87], [87, 185, 89], [88, 89, 185], [184, 88, 185], [90, 91, 186], [187, 90, 186], [93, 91, 24], [187, 188, 90], [90, 188, 92], [25, 96, 94], [190, 93, 189], [93, 94, 189], [95, 92, 188], [191, 95, 188], [39, 95, 98], [97, 192, 96], [193, 192, 97], [99, 98, 194], [195, 99, 194], [102, 50, 99], [97, 100, 193], [193, 100, 196], [197, 101, 102], [197, 198, 101], [196, 100, 103], [196, 103, 199], [105, 103, 2], [104, 101, 200], [200, 101, 198], [106, 201, 105], [202, 201, 106], [108, 106, 6], [203, 107, 104], [203, 104, 200], [109, 204, 108], [205, 204, 109], [107, 203, 110], [203, 206, 110], [111, 207, 109], [207, 205, 109], [208, 112, 110], [208, 110, 206], [72, 112, 115], [113, 207, 111], [209, 207, 113], [210, 114, 115], [210, 115, 211], [117, 78, 114], [209, 113, 212], [113, 116, 212], [214, 213, 117], [117, 213, 118], [212, 116, 215], [116, 119, 215], [122, 119, 16], [216, 120, 213], [120, 118, 213], [121, 26, 124], [218, 217, 121], [121, 217, 122], [80, 123, 127], [219, 123, 216], [123, 120, 216], [221, 220, 125], [125, 220, 124], [81, 126, 129], [127, 222, 126], [223, 222, 127], [224, 221, 128], [128, 221, 125], [226, 225, 129], [129, 225, 130], [131, 224, 128], [227, 224, 131], [130, 225, 132], [225, 228, 132], [131, 133, 227], [227, 133, 229], [228, 230, 132], [132, 230, 134], [137, 57, 134], [229, 133, 231], [133, 135, 231], [136, 135, 53], [137, 232, 136], [233, 232, 137], [235, 234, 138], [235, 138, 139], [234, 236, 138], [138, 236, 140], [139, 141, 235], [235, 141, 237], [238, 142, 140], [236, 238, 140], [237, 141, 143], [239, 237, 143], [238, 240, 142], [142, 240, 144], [241, 239, 145], [145, 239, 143], [242, 146, 144], [240, 242, 144], [241, 145, 147], [243, 241, 147], [242, 244, 146], [146, 244, 148], [245, 243, 149], [149, 243, 147], [244, 246, 150], [244, 150, 148], [245, 149, 151], [247, 245, 151], [246, 248, 150], [150, 248, 152], [249, 247, 153], [153, 247, 151], [248, 249, 153], [248, 153, 152], [155, 250, 154], [251, 250, 155], [251, 155, 252], [155, 156, 252], [250, 253, 154], [154, 253, 157], [156, 158, 252], [252, 158, 254], [157, 255, 159], [253, 255, 157], [160, 256, 158], [256, 254, 158], [255, 257, 159], [159, 257, 161], [160, 161, 257], [256, 160, 257], [163, 258, 162], [259, 258, 163], [163, 164, 259], [259, 164, 260], [258, 261, 162], [162, 261, 165], [164, 166, 262], [260, 164, 262], [165, 261, 167], [261, 263, 167], [168, 264, 166], [264, 262, 166], [263, 265, 167], [167, 265, 169], [168, 169, 265], [264, 168, 265], [170, 266, 171], [267, 266, 170], [170, 172, 267], [267, 172, 268], [171, 266, 173], [266, 269, 173], [172, 174, 268], [268, 174, 270], [173, 269, 175], [269, 271, 175], [272, 270, 176], [176, 270, 174], [271, 273, 175], [175, 273, 177], [176, 177, 273], [272, 176, 273], [274, 178, 179], [275, 274, 179], [275, 179, 180], [276, 275, 180], [277, 181, 274], [274, 181, 178], [278, 276, 182], [276, 180, 182], [279, 183, 277], [277, 183, 181], [280, 182, 184], [278, 182, 280], [281, 185, 183], [279, 281, 183], [281, 184, 185], [280, 184, 281], [91, 93, 190], [186, 91, 190], [187, 283, 282], [186, 283, 187], [284, 188, 282], [282, 188, 187], [189, 94, 192], [94, 96, 192], [189, 285, 283], [190, 189, 283], [188, 284, 286], [191, 188, 286], [191, 194, 95], [95, 194, 98], [193, 287, 192], [192, 287, 285], [194, 286, 195], [195, 286, 288], [99, 197, 102], [195, 197, 99], [289, 287, 196], [287, 193, 196], [198, 288, 290], [197, 288, 198], [199, 291, 196], [196, 291, 289], [103, 105, 201], [199, 103, 201], [292, 200, 198], [290, 292, 198], [201, 202, 291], [202, 293, 291], [106, 108, 204], [202, 106, 204], [203, 292, 294], [200, 292, 203], [204, 295, 293], [205, 295, 204], [296, 206, 294], [294, 206, 203], [297, 205, 207], [295, 205, 297], [206, 296, 298], [208, 206, 298], [208, 211, 112], [112, 211, 115], [209, 299, 207], [207, 299, 297], [211, 298, 210], [210, 298, 300], [114, 210, 117], [210, 214, 117], [301, 209, 212], [299, 209, 301], [213, 300, 302], [214, 300, 213], [212, 215, 301], [215, 303, 301], [119, 122, 217], [215, 119, 217], [304, 216, 302], [302, 216, 213], [124, 220, 121], [220, 218, 121], [218, 305, 303], [217, 218, 303], [223, 127, 219], [127, 123, 219], [219, 304, 306], [216, 304, 219], [221, 307, 220], [220, 307, 305], [222, 226, 126], [126, 226, 129], [222, 223, 308], [223, 306, 308], [309, 307, 224], [307, 221, 224], [226, 308, 225], [225, 308, 310], [227, 311, 309], [224, 227, 309], [310, 228, 225], [312, 228, 310], [313, 227, 229], [311, 227, 313], [230, 228, 314], [228, 312, 314], [134, 233, 137], [230, 233, 134], [229, 231, 313], [231, 315, 313], [135, 136, 232], [231, 135, 232], [233, 314, 232], [232, 314, 315], [317, 316, 235], [316, 234, 235], [318, 236, 234], [316, 318, 234], [317, 235, 319], [319, 235, 237], [318, 238, 236], [320, 238, 318], [321, 237, 239], [319, 237, 321], [322, 240, 320], [320, 240, 238], [323, 239, 241], [321, 239, 323], [322, 324, 240], [324, 242, 240], [325, 323, 243], [323, 241, 243], [326, 244, 242], [324, 326, 242], [325, 243, 327], [327, 243, 245], [326, 246, 244], [328, 246, 326], [329, 245, 247], [327, 245, 329], [330, 248, 328], [328, 248, 246], [329, 247, 331], [331, 247, 249], [330, 249, 248], [331, 249, 330], [333, 250, 332], [332, 250, 251], [332, 251, 252], [334, 332, 252], [335, 253, 250], [333, 335, 250], [336, 334, 254], [334, 252, 254], [337, 255, 253], [335, 337, 253], [338, 254, 256], [336, 254, 338], [339, 257, 255], [337, 339, 255], [339, 256, 257], [338, 256, 339], [341, 258, 340], [340, 258, 259], [340, 259, 342], [342, 259, 260], [343, 261, 341], [341, 261, 258], [344, 260, 262], [342, 260, 344], [345, 263, 343], [343, 263, 261], [346, 344, 264], [344, 262, 264], [347, 265, 263], [345, 347, 263], [347, 264, 265], [346, 264, 347], [349, 266, 348], [348, 266, 267], [348, 267, 268], [350, 348, 268], [351, 269, 266], [349, 351, 266], [352, 350, 270], [350, 268, 270], [353, 271, 269], [351, 353, 269], [354, 270, 272], [352, 270, 354], [355, 273, 271], [353, 355, 271], [355, 354, 273], [354, 272, 273], [314, 312, 336], [314, 336, 338], [314, 338, 339], [336, 312, 334], [312, 310, 334], [314, 339, 315], [315, 339, 337], [334, 310, 332], [332, 310, 356], [333, 332, 356], [356, 310, 357], [310, 308, 357], [315, 337, 313], [337, 335, 313], [357, 308, 358], [313, 335, 311], [335, 333, 311], [358, 308, 306], [358, 306, 359], [361, 358, 360], [358, 359, 360], [359, 306, 362], [305, 307, 328], [305, 328, 326], [305, 326, 324], [328, 307, 330], [307, 309, 331], [330, 307, 331], [331, 309, 329], [305, 324, 303], [322, 320, 303], [324, 322, 303], [303, 320, 318], [329, 309, 327], [362, 306, 304], [363, 362, 304], [316, 317, 301], [318, 316, 301], [303, 318, 301], [301, 317, 299], [319, 321, 299], [317, 319, 299], [363, 304, 354], [304, 302, 352], [354, 304, 352], [352, 302, 350], [363, 354, 355], [350, 302, 300], [350, 300, 348], [348, 300, 349], [355, 353, 294], [294, 353, 296], [353, 351, 296], [296, 351, 298], [349, 300, 298], [351, 349, 298], [293, 295, 278], [293, 278, 280], [295, 297, 276], [278, 295, 276], [293, 280, 291], [280, 281, 291], [276, 297, 275], [291, 281, 279], [291, 279, 289], [279, 277, 289], [289, 277, 287], [277, 274, 287], [287, 274, 364], [274, 275, 364], [364, 365, 285], [287, 364, 285], [285, 365, 366], [366, 368, 367], [366, 367, 369], [292, 290, 344], [292, 344, 346], [370, 346, 347], [344, 290, 342], [342, 290, 288], [342, 288, 340], [340, 288, 341], [370, 347, 282], [347, 345, 282], [282, 345, 284], [345, 343, 284], [341, 288, 286], [343, 341, 286], [284, 343, 286], [371, 370, 283], [369, 371, 283], [285, 366, 283], [366, 369, 283], [370, 282, 283], [325, 356, 364], [327, 356, 325], [309, 356, 327], [333, 356, 309], [311, 333, 309], [323, 325, 364], [321, 323, 364], [299, 321, 364], [275, 299, 364], [297, 299, 275], [368, 360, 367], [361, 360, 368], [346, 370, 363], [292, 346, 363], [355, 292, 363], [294, 292, 355], [283, 186, 190], [285, 189, 192], [194, 191, 286], [197, 195, 288], [201, 291, 199], [204, 293, 202], [211, 208, 298], [214, 210, 300], [217, 303, 215], [218, 220, 305], [219, 306, 223], [308, 226, 222], [233, 230, 314], [232, 315, 231], [364, 373, 372], [356, 373, 364], [364, 372, 365], [365, 372, 374], [356, 357, 373], [357, 375, 373], [365, 374, 376], [366, 365, 376], [357, 358, 375], [358, 377, 375], [368, 376, 378], [366, 376, 368], [358, 379, 377], [361, 379, 358], [368, 378, 361], [361, 378, 379], [367, 360, 380], [360, 381, 380], [367, 380, 382], [369, 367, 382], [360, 383, 381], [359, 383, 360], [369, 382, 384], [371, 369, 384], [359, 362, 383], [362, 385, 383], [370, 371, 386], [371, 384, 386], [362, 387, 385], [363, 387, 362], [370, 386, 363], [363, 386, 387], [373, 388, 372], [389, 388, 373], [372, 388, 374], [388, 390, 374], [389, 373, 391], [373, 375, 391], [376, 374, 390], [392, 376, 390], [377, 391, 375], [393, 391, 377], [392, 394, 376], [376, 394, 378], [393, 377, 395], [377, 379, 395], [379, 378, 394], [395, 379, 394], [381, 396, 380], [397, 396, 381], [380, 396, 382], [396, 398, 382], [397, 381, 399], [381, 383, 399], [384, 382, 400], [400, 382, 398], [385, 399, 383], [401, 399, 385], [384, 400, 386], [400, 402, 386], [401, 385, 403], [385, 387, 403], [403, 387, 386], [403, 386, 402], [388, 389, 404], [389, 405, 404], [404, 390, 388], [391, 405, 389], [390, 404, 406], [392, 390, 406], [391, 407, 405], [393, 407, 391], [394, 392, 406], [395, 407, 393], [395, 406, 407], [394, 406, 395], [397, 408, 396], [396, 408, 409], [409, 398, 396], [399, 408, 397], [398, 409, 410], [400, 398, 410], [399, 401, 408], [401, 411, 408], [402, 400, 410], [403, 411, 401], [403, 410, 411], [402, 410, 403], [404, 405, 406], [405, 407, 406], [409, 408, 410], [408, 411, 410]],convexity=10);
